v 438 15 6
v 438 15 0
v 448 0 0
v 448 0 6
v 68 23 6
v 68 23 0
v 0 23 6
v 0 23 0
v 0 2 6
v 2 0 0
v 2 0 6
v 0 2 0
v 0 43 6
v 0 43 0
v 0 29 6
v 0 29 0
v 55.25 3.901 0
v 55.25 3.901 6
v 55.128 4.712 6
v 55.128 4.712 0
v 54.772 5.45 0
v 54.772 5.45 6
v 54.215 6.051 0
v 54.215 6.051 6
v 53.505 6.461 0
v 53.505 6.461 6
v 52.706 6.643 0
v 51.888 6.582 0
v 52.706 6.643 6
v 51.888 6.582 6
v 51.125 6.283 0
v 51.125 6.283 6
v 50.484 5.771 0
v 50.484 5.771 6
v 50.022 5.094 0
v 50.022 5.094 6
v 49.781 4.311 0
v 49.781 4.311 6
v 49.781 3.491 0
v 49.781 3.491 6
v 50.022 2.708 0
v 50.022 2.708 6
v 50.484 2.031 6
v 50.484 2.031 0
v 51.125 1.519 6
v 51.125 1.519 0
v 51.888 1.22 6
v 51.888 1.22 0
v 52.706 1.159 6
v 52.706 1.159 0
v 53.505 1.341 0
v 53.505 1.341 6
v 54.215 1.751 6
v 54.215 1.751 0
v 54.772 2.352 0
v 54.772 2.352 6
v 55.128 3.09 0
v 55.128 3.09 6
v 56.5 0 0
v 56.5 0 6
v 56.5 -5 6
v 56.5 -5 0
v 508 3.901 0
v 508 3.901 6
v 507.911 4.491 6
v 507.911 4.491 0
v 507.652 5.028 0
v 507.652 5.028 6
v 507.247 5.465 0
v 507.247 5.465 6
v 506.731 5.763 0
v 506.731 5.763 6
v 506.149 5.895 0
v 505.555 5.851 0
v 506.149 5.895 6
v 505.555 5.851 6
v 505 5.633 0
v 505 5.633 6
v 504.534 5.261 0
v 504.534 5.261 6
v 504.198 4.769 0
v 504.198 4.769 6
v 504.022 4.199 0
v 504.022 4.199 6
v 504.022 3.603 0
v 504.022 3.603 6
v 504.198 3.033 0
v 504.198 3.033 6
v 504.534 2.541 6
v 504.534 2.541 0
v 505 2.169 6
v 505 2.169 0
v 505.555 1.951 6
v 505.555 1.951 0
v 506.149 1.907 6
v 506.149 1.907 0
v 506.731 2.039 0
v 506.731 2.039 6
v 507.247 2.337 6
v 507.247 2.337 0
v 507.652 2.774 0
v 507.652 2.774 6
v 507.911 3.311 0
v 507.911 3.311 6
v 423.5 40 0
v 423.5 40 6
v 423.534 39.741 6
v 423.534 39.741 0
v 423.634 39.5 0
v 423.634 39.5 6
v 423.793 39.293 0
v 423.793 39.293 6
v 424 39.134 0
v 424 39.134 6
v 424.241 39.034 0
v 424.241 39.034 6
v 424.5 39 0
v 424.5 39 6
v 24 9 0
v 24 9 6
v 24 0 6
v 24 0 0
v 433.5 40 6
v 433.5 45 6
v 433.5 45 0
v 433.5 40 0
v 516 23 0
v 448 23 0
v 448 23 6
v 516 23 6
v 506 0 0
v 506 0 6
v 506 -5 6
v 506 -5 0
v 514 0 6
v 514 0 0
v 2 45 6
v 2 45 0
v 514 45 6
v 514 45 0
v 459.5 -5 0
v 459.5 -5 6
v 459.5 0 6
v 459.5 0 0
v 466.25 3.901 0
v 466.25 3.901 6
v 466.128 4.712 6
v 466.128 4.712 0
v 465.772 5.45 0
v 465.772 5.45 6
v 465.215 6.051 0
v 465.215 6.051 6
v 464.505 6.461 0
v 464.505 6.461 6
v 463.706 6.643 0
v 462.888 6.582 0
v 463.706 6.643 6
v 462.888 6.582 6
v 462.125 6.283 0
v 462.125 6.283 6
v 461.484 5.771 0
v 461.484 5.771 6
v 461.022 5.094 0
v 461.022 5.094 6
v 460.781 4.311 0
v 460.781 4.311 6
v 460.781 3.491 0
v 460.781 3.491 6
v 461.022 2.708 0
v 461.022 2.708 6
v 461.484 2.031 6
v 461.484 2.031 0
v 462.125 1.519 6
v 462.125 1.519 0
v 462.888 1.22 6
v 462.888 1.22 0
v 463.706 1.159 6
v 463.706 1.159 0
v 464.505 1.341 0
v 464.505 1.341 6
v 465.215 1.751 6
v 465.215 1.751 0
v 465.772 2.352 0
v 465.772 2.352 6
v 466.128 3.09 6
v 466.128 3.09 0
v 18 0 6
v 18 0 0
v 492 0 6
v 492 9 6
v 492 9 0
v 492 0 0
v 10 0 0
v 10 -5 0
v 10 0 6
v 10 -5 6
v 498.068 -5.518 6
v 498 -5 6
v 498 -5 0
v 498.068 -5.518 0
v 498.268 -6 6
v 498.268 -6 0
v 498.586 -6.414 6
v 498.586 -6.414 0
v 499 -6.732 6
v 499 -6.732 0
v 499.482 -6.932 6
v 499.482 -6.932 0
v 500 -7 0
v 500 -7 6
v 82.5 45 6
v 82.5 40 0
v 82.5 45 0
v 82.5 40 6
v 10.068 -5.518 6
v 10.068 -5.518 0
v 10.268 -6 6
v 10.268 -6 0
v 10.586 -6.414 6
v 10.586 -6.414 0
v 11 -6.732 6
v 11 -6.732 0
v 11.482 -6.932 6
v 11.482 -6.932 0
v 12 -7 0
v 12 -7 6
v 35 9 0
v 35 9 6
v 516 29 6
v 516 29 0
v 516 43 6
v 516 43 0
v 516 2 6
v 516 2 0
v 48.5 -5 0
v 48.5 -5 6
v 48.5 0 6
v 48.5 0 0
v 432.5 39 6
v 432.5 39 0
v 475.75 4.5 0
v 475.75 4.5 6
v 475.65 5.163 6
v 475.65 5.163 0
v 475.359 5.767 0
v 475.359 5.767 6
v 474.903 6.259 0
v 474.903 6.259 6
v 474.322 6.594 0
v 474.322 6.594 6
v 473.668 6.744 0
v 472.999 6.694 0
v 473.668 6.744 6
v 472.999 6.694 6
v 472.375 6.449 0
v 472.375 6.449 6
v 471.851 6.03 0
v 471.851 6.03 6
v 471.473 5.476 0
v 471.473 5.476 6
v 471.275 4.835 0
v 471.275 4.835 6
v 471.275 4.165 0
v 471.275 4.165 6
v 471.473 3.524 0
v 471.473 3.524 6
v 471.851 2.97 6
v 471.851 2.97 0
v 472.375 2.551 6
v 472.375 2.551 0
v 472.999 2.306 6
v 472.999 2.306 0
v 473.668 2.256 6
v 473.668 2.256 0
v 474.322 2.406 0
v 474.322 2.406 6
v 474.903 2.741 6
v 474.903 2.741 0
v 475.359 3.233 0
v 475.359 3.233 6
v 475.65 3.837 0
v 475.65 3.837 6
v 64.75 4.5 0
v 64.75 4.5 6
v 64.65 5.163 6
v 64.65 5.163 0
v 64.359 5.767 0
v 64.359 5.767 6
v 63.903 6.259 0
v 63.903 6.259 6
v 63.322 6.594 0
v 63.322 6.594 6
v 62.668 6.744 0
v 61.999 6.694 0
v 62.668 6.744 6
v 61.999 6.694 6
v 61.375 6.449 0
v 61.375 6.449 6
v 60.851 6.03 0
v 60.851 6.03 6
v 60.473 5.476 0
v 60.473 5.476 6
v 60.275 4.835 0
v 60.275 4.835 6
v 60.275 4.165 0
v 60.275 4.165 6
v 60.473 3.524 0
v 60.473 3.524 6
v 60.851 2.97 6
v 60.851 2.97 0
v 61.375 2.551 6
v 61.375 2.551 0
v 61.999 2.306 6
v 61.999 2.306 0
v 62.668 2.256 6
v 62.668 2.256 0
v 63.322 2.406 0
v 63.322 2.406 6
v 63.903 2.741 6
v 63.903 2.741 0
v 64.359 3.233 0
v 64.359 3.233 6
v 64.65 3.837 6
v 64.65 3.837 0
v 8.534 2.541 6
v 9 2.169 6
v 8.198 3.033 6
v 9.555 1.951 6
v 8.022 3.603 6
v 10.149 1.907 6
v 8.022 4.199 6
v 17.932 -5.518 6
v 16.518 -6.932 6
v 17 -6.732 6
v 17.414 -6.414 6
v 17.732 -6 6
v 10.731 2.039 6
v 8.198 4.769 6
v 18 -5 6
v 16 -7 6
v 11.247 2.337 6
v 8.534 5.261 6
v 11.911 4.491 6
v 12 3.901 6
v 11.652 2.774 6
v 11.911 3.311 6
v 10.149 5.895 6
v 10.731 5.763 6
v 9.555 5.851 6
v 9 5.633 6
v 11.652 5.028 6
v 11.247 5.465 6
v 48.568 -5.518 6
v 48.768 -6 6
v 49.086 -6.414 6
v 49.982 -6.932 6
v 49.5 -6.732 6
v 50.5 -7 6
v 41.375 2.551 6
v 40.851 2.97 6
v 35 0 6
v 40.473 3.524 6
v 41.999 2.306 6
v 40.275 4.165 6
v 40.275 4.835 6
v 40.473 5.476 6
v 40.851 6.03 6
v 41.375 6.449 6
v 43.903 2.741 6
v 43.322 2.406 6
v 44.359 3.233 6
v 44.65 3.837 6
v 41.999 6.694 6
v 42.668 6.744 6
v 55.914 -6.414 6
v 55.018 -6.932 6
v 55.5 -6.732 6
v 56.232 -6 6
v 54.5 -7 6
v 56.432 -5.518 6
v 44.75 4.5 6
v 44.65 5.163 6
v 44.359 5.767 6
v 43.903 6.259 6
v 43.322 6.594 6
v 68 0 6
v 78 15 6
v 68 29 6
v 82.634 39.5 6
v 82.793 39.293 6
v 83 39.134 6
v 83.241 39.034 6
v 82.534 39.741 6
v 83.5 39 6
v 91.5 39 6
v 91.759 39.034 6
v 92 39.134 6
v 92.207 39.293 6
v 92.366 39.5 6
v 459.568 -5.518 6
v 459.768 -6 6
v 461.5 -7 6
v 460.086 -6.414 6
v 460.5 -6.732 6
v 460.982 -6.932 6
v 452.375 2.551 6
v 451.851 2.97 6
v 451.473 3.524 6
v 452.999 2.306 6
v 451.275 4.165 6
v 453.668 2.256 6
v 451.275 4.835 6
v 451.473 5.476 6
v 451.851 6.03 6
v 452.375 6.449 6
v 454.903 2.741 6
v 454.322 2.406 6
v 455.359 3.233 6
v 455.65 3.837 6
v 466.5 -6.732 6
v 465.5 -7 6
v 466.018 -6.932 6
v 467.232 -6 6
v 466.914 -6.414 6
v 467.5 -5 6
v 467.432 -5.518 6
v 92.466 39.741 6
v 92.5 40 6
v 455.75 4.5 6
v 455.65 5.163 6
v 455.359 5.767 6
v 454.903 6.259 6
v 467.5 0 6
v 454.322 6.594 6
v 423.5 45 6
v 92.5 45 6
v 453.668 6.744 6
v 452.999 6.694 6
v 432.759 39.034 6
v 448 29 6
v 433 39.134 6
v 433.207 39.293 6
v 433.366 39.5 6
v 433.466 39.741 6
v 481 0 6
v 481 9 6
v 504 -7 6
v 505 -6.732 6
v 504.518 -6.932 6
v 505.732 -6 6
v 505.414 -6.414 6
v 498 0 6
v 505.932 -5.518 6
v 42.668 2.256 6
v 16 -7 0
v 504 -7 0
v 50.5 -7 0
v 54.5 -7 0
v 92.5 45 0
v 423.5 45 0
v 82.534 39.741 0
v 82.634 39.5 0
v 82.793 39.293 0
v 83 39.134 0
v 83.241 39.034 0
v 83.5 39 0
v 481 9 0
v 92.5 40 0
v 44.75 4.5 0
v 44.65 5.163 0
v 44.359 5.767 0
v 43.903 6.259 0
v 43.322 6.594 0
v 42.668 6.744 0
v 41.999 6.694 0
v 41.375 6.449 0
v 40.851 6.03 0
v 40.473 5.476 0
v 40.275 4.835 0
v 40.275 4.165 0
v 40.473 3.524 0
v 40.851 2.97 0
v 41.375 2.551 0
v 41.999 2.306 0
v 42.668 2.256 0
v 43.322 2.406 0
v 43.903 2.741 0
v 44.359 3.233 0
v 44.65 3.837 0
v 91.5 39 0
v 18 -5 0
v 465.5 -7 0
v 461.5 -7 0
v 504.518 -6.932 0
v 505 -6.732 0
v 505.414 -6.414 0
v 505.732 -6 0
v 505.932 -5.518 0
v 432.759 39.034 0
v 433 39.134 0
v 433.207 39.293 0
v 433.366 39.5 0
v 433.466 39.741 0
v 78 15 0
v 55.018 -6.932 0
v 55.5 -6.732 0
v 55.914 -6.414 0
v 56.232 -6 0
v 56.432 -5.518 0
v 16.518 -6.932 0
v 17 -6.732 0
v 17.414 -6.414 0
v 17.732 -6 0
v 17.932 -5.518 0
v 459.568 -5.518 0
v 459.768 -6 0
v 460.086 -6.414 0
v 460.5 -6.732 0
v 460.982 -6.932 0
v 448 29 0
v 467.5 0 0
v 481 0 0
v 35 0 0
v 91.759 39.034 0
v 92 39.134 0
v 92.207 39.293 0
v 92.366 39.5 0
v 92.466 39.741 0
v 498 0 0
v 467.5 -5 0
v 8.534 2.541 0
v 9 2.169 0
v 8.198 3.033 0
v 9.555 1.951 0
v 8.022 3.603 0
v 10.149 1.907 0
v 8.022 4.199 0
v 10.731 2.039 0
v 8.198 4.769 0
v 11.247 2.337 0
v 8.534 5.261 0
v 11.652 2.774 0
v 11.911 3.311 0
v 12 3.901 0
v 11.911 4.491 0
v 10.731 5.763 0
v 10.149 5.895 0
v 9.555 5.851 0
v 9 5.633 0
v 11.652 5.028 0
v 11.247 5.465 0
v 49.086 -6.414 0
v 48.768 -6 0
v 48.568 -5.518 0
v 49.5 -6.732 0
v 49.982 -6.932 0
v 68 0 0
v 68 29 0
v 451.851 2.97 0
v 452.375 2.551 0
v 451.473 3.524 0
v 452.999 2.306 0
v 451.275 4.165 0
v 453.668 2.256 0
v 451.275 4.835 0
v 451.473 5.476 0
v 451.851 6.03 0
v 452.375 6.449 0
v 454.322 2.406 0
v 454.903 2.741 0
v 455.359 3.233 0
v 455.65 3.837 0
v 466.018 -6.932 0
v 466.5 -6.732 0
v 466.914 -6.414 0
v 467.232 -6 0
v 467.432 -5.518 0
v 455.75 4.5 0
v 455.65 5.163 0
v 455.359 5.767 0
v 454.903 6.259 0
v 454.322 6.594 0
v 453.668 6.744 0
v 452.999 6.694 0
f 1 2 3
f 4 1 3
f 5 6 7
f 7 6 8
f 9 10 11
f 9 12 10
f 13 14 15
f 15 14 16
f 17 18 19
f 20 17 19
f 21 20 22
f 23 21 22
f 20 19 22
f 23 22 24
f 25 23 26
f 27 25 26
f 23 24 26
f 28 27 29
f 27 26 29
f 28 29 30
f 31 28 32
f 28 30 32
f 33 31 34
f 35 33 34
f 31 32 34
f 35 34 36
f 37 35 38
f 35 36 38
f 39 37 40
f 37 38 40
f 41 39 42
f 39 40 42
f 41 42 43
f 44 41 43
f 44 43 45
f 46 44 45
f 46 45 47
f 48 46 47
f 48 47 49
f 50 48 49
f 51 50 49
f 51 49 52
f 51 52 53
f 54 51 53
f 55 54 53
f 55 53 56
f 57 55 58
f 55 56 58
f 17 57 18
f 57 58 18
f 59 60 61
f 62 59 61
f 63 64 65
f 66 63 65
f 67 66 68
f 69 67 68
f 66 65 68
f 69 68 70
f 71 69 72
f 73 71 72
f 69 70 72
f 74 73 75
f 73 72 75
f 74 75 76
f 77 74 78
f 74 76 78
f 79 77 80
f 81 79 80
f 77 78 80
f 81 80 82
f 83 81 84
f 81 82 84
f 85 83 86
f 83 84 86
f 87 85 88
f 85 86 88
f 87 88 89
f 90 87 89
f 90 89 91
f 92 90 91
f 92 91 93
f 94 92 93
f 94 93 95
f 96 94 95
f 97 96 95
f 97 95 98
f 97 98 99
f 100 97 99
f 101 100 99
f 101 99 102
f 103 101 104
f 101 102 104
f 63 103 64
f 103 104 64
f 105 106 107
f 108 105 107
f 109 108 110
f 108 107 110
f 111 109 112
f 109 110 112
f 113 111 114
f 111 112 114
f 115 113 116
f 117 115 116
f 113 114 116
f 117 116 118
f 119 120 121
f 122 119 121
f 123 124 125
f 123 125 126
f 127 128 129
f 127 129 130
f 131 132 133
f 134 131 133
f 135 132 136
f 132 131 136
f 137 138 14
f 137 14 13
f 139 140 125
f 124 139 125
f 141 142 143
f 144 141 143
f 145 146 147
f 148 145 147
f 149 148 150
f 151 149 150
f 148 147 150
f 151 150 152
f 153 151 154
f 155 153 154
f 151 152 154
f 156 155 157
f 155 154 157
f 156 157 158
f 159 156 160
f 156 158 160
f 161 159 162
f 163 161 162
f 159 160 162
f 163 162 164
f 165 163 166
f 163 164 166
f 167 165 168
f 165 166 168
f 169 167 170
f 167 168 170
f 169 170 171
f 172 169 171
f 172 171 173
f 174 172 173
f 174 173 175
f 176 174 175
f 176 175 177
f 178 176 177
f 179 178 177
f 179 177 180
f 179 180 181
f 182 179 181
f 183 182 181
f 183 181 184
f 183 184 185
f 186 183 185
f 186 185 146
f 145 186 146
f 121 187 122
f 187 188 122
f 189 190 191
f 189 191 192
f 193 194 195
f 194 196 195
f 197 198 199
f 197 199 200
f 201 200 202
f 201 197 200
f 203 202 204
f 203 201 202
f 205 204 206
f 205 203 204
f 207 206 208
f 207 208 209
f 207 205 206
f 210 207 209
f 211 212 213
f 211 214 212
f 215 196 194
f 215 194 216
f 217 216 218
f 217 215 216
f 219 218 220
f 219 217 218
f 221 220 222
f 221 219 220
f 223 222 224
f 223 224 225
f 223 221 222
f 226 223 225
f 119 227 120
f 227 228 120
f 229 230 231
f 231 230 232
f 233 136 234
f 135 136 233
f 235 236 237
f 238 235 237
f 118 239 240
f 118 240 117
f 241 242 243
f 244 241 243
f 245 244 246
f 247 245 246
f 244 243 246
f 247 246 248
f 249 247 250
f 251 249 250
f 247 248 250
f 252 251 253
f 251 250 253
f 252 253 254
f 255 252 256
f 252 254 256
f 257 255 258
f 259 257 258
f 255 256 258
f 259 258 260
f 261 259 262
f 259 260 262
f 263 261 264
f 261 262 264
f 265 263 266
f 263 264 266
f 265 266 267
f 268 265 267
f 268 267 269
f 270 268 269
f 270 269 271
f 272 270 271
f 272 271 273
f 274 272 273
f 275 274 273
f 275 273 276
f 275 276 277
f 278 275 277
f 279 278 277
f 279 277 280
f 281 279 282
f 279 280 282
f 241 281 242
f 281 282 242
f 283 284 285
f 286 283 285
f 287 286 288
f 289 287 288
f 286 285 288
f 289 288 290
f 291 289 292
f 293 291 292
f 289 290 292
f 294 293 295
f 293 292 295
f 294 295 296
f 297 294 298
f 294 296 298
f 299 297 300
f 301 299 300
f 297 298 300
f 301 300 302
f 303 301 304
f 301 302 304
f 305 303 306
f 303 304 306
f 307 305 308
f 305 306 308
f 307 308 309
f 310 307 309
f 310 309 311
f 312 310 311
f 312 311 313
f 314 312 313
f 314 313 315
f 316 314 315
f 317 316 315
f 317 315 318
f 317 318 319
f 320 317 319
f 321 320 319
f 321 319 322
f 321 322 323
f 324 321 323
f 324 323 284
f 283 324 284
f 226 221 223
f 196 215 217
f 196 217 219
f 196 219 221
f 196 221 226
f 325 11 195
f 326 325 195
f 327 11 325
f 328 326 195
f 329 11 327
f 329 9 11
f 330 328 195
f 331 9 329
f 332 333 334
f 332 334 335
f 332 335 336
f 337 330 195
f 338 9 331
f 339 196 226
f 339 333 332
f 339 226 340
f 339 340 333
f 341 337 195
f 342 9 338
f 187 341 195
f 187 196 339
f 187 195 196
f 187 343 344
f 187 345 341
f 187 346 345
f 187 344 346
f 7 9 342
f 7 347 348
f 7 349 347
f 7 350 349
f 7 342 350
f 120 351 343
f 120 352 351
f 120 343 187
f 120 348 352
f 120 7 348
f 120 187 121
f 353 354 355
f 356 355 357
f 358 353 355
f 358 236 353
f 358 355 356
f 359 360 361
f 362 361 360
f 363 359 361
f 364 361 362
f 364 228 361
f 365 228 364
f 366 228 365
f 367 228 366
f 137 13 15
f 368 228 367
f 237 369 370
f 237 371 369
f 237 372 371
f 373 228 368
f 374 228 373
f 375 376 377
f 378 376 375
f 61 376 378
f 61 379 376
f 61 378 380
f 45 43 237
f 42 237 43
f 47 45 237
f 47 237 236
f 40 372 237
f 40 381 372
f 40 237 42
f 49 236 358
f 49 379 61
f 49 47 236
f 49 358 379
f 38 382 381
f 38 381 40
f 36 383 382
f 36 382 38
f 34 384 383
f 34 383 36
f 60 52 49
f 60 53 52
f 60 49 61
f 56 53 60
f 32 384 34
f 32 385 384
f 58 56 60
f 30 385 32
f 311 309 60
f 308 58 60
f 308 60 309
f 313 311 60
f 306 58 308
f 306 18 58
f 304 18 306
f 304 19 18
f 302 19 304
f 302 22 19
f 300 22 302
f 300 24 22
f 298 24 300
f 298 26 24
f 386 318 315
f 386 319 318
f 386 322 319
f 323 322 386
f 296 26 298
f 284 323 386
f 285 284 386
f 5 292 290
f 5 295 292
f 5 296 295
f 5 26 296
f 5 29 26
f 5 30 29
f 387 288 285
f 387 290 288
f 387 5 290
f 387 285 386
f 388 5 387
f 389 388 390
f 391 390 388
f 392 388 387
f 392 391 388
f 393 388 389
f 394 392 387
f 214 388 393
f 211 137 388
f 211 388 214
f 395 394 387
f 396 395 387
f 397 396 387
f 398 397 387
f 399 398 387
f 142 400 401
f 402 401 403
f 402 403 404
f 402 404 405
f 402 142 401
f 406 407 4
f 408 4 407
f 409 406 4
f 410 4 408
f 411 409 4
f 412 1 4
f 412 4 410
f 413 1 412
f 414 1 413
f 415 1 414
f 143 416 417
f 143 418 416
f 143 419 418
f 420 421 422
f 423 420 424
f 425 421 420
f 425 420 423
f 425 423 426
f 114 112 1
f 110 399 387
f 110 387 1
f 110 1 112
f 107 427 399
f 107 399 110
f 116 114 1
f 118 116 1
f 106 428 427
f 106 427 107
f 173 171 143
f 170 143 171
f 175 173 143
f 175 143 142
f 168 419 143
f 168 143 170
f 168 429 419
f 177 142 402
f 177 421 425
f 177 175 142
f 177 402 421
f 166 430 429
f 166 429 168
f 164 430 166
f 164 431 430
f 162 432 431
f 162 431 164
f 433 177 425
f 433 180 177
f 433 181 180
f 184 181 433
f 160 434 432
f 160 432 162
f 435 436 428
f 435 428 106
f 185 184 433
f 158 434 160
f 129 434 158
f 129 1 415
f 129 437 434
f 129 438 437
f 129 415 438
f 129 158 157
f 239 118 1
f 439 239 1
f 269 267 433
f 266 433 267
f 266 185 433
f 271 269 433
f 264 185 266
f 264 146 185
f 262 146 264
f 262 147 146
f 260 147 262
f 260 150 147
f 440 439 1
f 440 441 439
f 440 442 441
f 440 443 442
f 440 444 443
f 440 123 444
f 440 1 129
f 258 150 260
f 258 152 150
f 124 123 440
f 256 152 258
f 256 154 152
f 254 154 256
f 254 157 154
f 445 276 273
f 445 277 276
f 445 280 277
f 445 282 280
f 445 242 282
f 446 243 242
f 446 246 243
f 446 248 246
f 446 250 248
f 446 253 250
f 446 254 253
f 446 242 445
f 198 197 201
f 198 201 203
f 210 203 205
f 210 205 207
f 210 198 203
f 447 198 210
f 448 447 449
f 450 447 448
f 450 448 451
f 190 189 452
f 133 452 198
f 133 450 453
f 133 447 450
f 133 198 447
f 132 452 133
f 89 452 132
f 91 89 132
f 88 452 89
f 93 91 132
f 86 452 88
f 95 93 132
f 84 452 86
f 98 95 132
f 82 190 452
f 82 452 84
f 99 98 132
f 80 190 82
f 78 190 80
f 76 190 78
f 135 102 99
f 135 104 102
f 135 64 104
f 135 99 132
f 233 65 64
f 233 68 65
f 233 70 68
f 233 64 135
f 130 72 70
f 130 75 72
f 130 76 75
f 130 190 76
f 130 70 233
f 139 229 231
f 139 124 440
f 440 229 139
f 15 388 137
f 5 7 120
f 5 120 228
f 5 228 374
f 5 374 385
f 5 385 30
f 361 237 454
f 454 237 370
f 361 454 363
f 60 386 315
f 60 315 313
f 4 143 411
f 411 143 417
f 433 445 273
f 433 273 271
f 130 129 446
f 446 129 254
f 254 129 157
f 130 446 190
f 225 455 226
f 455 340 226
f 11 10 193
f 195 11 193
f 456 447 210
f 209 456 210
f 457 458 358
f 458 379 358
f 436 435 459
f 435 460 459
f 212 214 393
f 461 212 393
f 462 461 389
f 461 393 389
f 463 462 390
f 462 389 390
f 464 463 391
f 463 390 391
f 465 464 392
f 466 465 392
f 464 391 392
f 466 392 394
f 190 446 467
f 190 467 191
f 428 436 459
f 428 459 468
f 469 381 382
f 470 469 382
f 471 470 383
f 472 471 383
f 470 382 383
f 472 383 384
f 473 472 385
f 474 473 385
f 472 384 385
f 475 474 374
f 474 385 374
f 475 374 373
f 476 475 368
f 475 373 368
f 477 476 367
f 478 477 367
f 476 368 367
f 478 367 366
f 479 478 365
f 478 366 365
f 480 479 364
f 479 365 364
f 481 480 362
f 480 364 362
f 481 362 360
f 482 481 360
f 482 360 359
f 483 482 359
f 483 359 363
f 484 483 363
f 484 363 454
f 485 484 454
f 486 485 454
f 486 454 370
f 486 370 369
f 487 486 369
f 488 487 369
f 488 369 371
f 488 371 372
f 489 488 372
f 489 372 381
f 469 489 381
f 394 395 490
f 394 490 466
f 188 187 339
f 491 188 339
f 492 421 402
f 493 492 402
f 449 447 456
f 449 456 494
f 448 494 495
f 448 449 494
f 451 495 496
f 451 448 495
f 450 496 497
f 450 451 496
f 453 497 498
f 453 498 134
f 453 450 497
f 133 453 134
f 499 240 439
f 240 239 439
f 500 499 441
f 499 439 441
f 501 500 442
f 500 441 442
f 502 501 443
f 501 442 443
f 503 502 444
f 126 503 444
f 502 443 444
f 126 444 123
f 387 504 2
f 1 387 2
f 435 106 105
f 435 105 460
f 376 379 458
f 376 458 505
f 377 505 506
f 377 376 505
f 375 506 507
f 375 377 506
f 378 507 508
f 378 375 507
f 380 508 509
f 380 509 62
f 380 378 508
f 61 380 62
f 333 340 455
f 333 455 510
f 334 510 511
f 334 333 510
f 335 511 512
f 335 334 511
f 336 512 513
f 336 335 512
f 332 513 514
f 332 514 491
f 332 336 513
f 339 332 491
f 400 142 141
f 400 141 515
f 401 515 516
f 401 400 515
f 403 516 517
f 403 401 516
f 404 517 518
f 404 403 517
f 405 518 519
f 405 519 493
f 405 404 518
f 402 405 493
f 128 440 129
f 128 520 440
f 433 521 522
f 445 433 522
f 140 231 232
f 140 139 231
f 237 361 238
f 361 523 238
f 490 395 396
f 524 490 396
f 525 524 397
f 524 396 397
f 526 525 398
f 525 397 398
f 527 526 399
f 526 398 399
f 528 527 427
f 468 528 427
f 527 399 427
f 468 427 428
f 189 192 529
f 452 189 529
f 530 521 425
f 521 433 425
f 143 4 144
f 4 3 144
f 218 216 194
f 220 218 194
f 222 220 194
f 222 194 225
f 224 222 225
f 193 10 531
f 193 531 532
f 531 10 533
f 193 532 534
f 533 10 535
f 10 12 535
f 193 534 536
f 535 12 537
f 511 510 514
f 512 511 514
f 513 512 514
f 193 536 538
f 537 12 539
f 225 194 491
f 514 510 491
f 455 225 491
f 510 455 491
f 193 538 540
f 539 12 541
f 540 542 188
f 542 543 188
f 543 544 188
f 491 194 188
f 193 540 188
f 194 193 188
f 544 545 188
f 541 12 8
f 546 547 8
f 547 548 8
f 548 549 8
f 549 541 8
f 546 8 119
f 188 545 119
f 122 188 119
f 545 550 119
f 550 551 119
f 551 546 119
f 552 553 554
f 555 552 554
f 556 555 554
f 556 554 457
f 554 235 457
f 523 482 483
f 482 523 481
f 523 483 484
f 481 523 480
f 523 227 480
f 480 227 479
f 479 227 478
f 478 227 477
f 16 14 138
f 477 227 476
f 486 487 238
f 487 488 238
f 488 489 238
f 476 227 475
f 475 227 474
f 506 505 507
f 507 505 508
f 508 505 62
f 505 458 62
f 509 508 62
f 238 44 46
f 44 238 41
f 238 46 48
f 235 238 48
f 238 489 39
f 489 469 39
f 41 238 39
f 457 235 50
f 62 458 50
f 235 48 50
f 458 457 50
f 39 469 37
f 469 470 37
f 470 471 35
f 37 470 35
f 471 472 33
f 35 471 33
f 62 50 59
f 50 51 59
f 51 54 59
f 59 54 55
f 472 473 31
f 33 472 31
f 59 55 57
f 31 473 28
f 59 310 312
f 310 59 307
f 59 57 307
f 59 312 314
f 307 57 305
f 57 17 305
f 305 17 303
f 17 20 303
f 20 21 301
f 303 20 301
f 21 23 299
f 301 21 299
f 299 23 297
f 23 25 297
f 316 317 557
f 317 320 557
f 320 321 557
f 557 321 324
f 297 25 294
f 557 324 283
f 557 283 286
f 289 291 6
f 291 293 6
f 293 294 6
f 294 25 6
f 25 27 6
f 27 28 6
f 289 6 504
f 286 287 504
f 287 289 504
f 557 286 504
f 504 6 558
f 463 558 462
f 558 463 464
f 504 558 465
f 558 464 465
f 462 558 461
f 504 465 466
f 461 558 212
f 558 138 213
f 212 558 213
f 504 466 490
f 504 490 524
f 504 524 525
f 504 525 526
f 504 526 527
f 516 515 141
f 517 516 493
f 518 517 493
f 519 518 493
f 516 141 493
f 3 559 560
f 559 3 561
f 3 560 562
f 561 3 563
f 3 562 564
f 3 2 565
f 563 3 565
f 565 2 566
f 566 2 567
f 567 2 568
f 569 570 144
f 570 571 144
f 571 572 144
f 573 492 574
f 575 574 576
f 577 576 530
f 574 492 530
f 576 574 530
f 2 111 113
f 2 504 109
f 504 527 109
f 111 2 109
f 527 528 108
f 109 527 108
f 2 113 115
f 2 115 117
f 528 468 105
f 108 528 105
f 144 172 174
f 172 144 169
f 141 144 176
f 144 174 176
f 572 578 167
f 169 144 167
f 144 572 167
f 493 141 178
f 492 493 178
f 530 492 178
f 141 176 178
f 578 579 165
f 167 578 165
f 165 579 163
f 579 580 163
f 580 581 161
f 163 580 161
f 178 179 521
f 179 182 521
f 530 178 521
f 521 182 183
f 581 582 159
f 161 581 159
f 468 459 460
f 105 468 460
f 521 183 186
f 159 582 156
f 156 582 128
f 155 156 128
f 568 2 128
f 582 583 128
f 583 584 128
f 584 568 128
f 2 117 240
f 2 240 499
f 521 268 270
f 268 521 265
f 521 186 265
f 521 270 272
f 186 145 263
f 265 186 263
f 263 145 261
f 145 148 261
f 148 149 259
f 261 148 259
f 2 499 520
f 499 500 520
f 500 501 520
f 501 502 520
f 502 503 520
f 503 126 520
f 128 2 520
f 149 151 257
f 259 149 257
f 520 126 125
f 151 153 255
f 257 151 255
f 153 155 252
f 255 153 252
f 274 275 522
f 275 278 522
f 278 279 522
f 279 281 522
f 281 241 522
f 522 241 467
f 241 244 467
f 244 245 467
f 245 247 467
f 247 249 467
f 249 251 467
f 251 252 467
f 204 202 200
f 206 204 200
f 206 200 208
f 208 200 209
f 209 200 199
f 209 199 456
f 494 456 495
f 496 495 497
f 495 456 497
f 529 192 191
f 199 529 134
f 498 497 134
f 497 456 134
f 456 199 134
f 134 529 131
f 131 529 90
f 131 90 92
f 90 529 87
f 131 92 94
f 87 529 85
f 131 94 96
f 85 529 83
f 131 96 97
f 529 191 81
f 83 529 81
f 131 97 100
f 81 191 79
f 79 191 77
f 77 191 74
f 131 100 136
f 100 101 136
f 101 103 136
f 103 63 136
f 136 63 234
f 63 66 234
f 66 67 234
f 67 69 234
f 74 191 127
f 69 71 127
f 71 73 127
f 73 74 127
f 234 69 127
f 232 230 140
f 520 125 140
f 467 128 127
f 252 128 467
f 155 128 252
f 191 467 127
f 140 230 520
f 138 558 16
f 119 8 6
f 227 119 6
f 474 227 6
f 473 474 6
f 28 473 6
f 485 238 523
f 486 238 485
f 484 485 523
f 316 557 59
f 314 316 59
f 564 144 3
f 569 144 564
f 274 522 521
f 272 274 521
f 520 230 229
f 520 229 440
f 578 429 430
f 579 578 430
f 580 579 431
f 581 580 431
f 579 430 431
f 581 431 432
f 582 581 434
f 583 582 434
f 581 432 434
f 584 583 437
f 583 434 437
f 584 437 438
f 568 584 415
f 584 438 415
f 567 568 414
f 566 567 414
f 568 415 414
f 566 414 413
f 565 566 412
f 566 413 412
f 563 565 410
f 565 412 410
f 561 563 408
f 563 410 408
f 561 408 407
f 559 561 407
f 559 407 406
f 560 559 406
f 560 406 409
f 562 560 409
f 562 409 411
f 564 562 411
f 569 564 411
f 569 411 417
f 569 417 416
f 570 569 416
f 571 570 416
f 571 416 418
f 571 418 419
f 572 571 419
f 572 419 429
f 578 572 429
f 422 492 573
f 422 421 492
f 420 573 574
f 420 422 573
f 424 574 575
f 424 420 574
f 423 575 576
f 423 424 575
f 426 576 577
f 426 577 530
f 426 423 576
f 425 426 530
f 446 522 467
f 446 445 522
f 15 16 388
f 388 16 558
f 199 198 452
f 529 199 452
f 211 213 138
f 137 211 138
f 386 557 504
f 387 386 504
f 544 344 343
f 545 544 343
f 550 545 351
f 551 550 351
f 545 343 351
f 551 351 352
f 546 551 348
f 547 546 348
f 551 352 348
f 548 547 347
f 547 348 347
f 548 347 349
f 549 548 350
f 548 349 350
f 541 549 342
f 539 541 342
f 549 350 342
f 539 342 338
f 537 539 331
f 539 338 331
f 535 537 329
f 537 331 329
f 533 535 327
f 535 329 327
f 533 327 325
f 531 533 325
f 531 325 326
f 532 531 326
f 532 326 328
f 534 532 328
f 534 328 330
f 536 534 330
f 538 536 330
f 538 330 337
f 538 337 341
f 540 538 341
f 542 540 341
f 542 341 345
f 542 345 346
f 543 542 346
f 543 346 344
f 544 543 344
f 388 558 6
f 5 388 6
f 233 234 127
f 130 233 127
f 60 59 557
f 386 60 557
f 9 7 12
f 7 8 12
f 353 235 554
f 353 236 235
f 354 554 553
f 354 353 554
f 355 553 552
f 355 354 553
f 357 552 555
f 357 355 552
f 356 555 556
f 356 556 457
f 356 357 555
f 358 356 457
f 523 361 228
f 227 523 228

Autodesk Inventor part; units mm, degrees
ref_plane "YZ Plane" through (0, 0, 0) normal (1, 0, 0) x (0, 1, 0)
ref_plane "XZ Plane" through (0, 0, 0) normal (0, 1, 0) x (-1, 0, 0)
ref_plane "XY Plane" through (0, 0, 0) normal (0, 0, 1) x (1, 0, 0)
sketch "Sketch1" plane through (0, 0, 0) normal (0, 0, 1) x (1, 0, 0)
  line L0 (516, 45) -> (0, 45)
  line L1 (68, 0) -> (78, 15)
  line L2 (78, 15) -> (438, 15)
  line L3 (438, 15) -> (448, 0)
  line L4 (0, 0) -> (68, 0)
  line L5 (448, 0) -> (516, 0)
  line L6 (0, 29) -> (68, 29)
  line L7 (68, 29) -> (68, 23)
  line L8 (68, 23) -> (0, 23)
  line L9 (0, 45) -> (0, 29)
  line L10 (0, 23) -> (0, 0)
  line L11 (516, 29) -> (448, 29)
  line L12 (448, 29) -> (448, 23)
  line L13 (448, 23) -> (516, 23)
  line L14 (516, 0) -> (516, 23)
  line L15 (516, 29) -> (516, 45)
  dimension "d3" = 6
  dimension "d4" = 68
  dimension "d5" = 68
  dimension "d6" = 516
  dimension "d7" = 15
  dimension "d8" = 23
  dimension "d9" = 16
  dimension "d12" = 10
  dimension "d13" = 10
  dimension "d14" = 10
  dimension "d15" = 10
extrude "Extrusion1" add sketch "Sketch1" along normal blind 6
sketch "Sketch2" plane through (0, 0, 6) normal (0, 0, 1) x (1, 0, 0)
  line L0 (0, 0) -> (68, 0) projected
  line L1 (448, 0) -> (516, 0) projected
  line L2 (516, 0) -> (516, 23) projected
  line L3 (516, 29) -> (516, 45) projected
  line L4 (516, 45) -> (0, 45) projected
  line L5 (0, 45) -> (0, 29) projected
  line L6 (0, 23) -> (0, 0) projected
  line L7 (24, 0) -> (35, 0)
  line L8 (35, 0) -> (35, 9)
  line L9 (35, 9) -> (24, 9)
  line L10 (24, 9) -> (24, 0)
  circle A0 centre (42.5, 4.5) radius 2.25
  circle A1 centre (52.5, 3.901) radius 2.75
  circle A2 centre (62.5, 4.5) radius 2.25
  line L11 (492, 0) -> (481, 0)
  line L12 (481, 0) -> (481, 9)
  line L13 (481, 9) -> (492, 9)
  line L14 (492, 9) -> (492, 0)
  circle A3 centre (453.5, 4.5) radius 2.25
  circle A4 centre (463.5, 3.901) radius 2.75
  circle A5 centre (473.5, 4.5) radius 2.25
  line L15 (82.5, 45) -> (92.5, 45)
  line L16 (92.5, 45) -> (92.5, 40)
  line L17 (91.5, 39) -> (83.5, 39)
  line L18 (82.5, 40) -> (82.5, 45)
  line L19 (423.5, 45) -> (433.5, 45)
  line L20 (433.5, 45) -> (433.5, 40)
  line L21 (432.5, 39) -> (424.5, 39)
  line L22 (423.5, 40) -> (423.5, 45)
  arc A6 (82.5, 40) -> (83.5, 39) centre (83.5, 40) ccw
  arc A7 (91.5, 39) -> (92.5, 40) centre (91.5, 40) ccw
  arc A8 (423.5, 40) -> (424.5, 39) centre (424.5, 40) ccw
  arc A9 (432.5, 39) -> (433.5, 40) centre (432.5, 40) ccw
  circle A10 centre (29.5, 3.901) radius 7.5 construction
  point P0 (486.5, 9)
  point P1 (35, 4.5)
  point P2 (87.5, 39)
  point P3 (428.5, 39)
  dimension "d16" = 11
  dimension "d18" = 4.5
  dimension "d19" = 5.5
  dimension "d20" = 11
  dimension "d21" = 1
  dimension "d22" = 10
  dimension "d23" = 10
  dimension "d24" = 6
  dimension "d27" = 24
  dimension "d29" = 23
  dimension "d30" = 24
  dimension "d31" = 10
  dimension "d32" = 10
  dimension "d33" = 10
  dimension "d34" = 10
  dimension "d35" = 9
  dimension "d38" = 15
  dimension "d39" = 23
  dimension "d49" = 87.5
  dimension "d50" = 87.5
extrude "Extrusion2" cut sketch "Sketch2" against normal blind 6
chamfer "Chamfer1" distance 2 angle 45 4 edges at (0, 45, 3) (0, 0, 3) (516, 45, 3) (516, 0, 3)
sketch "Sketch3" plane through (0, 0, 6) normal (0, 0, 1) x (1, 0, 0)
  line L0 (516, 2) -> (516, 23) projected
  line L1 (0, 23) -> (0, 2) projected
  circle A0 centre (52.5, 3.901) radius 2.75 projected
  circle A1 centre (10, 3.901) radius 2
  circle A2 centre (506, 3.901) radius 2
  point P0 (0, 0)
  dimension "d43" = 4
  dimension "d44" = 10
  dimension "d45" = 4
  dimension "d46" = 10
extrude "Extrusion3" cut sketch "Sketch3" against normal through all contours A1 | A2
sketch "Sketch4" plane through (0, 0, 6) normal (0, 0, 1) x (1, 0, 0)
  line L0 (516, 2) -> (516, 23) projected
  line L1 (0, 23) -> (0, 2) projected
  line L2 (2, 0) -> (24, 0) projected
  line L3 (35, 0) -> (68, 0) projected
  line L4 (448, 0) -> (481, 0) projected
  line L5 (492, 0) -> (514, 0) projected
  line L6 (10, 0) -> (18, 0)
  line L7 (18, 0) -> (18, -5)
  line L8 (16, -7) -> (12, -7)
  line L9 (10, -5) -> (10, 0)
  line L10 (48.5, 0) -> (56.5, 0)
  line L11 (56.5, 0) -> (56.5, -5)
  line L12 (54.5, -7) -> (50.5, -7)
  line L13 (48.5, -5) -> (48.5, 0)
  line L14 (459.5, 0) -> (467.5, 0)
  line L15 (467.5, 0) -> (467.5, -5)
  line L16 (465.5, -7) -> (461.5, -7)
  line L17 (459.5, -5) -> (459.5, 0)
  line L18 (498, 0) -> (506, 0)
  line L19 (506, 0) -> (506, -5)
  line L20 (504, -7) -> (500, -7)
  line L21 (498, -5) -> (498, 0)
  arc A0 (10, -5) -> (12, -7) centre (12, -5) ccw
  arc A1 (16, -7) -> (18, -5) centre (16, -5) ccw
  arc A2 (48.5, -5) -> (50.5, -7) centre (50.5, -5) ccw
  arc A3 (54.5, -7) -> (56.5, -5) centre (54.5, -5) ccw
  arc A4 (459.5, -5) -> (461.5, -7) centre (461.5, -5) ccw
  arc A5 (465.5, -7) -> (467.5, -5) centre (465.5, -5) ccw
  arc A6 (498, -5) -> (500, -7) centre (500, -5) ccw
  arc A7 (504, -7) -> (506, -5) centre (504, -5) ccw
  point P0 (0, 0)
  dimension "d51" = 2
  dimension "d52" = 8
  dimension "d53" = 8
  dimension "d54" = 8
  dimension "d55" = 8
  dimension "d56" = 7
  dimension "d57" = 10
  dimension "d58" = 30.5
  dimension "d59" = 10
  dimension "d60" = 30.5
extrude "Extrusion4" add sketch "Sketch4" against normal blind 6
equation "\"d5\" = d4"
equation "\"d20\" = d16"
equation "\"d23\" = d22"
equation "\"d30\" = d27"
equation "\"d50\" = d49"
equation "\"d45\" = d43"
equation "\"d46\" = d44"
equation "\"d59\" = d57"
equation "\"d60\" = d58"
properties part number "x_axis_chain_holder"
